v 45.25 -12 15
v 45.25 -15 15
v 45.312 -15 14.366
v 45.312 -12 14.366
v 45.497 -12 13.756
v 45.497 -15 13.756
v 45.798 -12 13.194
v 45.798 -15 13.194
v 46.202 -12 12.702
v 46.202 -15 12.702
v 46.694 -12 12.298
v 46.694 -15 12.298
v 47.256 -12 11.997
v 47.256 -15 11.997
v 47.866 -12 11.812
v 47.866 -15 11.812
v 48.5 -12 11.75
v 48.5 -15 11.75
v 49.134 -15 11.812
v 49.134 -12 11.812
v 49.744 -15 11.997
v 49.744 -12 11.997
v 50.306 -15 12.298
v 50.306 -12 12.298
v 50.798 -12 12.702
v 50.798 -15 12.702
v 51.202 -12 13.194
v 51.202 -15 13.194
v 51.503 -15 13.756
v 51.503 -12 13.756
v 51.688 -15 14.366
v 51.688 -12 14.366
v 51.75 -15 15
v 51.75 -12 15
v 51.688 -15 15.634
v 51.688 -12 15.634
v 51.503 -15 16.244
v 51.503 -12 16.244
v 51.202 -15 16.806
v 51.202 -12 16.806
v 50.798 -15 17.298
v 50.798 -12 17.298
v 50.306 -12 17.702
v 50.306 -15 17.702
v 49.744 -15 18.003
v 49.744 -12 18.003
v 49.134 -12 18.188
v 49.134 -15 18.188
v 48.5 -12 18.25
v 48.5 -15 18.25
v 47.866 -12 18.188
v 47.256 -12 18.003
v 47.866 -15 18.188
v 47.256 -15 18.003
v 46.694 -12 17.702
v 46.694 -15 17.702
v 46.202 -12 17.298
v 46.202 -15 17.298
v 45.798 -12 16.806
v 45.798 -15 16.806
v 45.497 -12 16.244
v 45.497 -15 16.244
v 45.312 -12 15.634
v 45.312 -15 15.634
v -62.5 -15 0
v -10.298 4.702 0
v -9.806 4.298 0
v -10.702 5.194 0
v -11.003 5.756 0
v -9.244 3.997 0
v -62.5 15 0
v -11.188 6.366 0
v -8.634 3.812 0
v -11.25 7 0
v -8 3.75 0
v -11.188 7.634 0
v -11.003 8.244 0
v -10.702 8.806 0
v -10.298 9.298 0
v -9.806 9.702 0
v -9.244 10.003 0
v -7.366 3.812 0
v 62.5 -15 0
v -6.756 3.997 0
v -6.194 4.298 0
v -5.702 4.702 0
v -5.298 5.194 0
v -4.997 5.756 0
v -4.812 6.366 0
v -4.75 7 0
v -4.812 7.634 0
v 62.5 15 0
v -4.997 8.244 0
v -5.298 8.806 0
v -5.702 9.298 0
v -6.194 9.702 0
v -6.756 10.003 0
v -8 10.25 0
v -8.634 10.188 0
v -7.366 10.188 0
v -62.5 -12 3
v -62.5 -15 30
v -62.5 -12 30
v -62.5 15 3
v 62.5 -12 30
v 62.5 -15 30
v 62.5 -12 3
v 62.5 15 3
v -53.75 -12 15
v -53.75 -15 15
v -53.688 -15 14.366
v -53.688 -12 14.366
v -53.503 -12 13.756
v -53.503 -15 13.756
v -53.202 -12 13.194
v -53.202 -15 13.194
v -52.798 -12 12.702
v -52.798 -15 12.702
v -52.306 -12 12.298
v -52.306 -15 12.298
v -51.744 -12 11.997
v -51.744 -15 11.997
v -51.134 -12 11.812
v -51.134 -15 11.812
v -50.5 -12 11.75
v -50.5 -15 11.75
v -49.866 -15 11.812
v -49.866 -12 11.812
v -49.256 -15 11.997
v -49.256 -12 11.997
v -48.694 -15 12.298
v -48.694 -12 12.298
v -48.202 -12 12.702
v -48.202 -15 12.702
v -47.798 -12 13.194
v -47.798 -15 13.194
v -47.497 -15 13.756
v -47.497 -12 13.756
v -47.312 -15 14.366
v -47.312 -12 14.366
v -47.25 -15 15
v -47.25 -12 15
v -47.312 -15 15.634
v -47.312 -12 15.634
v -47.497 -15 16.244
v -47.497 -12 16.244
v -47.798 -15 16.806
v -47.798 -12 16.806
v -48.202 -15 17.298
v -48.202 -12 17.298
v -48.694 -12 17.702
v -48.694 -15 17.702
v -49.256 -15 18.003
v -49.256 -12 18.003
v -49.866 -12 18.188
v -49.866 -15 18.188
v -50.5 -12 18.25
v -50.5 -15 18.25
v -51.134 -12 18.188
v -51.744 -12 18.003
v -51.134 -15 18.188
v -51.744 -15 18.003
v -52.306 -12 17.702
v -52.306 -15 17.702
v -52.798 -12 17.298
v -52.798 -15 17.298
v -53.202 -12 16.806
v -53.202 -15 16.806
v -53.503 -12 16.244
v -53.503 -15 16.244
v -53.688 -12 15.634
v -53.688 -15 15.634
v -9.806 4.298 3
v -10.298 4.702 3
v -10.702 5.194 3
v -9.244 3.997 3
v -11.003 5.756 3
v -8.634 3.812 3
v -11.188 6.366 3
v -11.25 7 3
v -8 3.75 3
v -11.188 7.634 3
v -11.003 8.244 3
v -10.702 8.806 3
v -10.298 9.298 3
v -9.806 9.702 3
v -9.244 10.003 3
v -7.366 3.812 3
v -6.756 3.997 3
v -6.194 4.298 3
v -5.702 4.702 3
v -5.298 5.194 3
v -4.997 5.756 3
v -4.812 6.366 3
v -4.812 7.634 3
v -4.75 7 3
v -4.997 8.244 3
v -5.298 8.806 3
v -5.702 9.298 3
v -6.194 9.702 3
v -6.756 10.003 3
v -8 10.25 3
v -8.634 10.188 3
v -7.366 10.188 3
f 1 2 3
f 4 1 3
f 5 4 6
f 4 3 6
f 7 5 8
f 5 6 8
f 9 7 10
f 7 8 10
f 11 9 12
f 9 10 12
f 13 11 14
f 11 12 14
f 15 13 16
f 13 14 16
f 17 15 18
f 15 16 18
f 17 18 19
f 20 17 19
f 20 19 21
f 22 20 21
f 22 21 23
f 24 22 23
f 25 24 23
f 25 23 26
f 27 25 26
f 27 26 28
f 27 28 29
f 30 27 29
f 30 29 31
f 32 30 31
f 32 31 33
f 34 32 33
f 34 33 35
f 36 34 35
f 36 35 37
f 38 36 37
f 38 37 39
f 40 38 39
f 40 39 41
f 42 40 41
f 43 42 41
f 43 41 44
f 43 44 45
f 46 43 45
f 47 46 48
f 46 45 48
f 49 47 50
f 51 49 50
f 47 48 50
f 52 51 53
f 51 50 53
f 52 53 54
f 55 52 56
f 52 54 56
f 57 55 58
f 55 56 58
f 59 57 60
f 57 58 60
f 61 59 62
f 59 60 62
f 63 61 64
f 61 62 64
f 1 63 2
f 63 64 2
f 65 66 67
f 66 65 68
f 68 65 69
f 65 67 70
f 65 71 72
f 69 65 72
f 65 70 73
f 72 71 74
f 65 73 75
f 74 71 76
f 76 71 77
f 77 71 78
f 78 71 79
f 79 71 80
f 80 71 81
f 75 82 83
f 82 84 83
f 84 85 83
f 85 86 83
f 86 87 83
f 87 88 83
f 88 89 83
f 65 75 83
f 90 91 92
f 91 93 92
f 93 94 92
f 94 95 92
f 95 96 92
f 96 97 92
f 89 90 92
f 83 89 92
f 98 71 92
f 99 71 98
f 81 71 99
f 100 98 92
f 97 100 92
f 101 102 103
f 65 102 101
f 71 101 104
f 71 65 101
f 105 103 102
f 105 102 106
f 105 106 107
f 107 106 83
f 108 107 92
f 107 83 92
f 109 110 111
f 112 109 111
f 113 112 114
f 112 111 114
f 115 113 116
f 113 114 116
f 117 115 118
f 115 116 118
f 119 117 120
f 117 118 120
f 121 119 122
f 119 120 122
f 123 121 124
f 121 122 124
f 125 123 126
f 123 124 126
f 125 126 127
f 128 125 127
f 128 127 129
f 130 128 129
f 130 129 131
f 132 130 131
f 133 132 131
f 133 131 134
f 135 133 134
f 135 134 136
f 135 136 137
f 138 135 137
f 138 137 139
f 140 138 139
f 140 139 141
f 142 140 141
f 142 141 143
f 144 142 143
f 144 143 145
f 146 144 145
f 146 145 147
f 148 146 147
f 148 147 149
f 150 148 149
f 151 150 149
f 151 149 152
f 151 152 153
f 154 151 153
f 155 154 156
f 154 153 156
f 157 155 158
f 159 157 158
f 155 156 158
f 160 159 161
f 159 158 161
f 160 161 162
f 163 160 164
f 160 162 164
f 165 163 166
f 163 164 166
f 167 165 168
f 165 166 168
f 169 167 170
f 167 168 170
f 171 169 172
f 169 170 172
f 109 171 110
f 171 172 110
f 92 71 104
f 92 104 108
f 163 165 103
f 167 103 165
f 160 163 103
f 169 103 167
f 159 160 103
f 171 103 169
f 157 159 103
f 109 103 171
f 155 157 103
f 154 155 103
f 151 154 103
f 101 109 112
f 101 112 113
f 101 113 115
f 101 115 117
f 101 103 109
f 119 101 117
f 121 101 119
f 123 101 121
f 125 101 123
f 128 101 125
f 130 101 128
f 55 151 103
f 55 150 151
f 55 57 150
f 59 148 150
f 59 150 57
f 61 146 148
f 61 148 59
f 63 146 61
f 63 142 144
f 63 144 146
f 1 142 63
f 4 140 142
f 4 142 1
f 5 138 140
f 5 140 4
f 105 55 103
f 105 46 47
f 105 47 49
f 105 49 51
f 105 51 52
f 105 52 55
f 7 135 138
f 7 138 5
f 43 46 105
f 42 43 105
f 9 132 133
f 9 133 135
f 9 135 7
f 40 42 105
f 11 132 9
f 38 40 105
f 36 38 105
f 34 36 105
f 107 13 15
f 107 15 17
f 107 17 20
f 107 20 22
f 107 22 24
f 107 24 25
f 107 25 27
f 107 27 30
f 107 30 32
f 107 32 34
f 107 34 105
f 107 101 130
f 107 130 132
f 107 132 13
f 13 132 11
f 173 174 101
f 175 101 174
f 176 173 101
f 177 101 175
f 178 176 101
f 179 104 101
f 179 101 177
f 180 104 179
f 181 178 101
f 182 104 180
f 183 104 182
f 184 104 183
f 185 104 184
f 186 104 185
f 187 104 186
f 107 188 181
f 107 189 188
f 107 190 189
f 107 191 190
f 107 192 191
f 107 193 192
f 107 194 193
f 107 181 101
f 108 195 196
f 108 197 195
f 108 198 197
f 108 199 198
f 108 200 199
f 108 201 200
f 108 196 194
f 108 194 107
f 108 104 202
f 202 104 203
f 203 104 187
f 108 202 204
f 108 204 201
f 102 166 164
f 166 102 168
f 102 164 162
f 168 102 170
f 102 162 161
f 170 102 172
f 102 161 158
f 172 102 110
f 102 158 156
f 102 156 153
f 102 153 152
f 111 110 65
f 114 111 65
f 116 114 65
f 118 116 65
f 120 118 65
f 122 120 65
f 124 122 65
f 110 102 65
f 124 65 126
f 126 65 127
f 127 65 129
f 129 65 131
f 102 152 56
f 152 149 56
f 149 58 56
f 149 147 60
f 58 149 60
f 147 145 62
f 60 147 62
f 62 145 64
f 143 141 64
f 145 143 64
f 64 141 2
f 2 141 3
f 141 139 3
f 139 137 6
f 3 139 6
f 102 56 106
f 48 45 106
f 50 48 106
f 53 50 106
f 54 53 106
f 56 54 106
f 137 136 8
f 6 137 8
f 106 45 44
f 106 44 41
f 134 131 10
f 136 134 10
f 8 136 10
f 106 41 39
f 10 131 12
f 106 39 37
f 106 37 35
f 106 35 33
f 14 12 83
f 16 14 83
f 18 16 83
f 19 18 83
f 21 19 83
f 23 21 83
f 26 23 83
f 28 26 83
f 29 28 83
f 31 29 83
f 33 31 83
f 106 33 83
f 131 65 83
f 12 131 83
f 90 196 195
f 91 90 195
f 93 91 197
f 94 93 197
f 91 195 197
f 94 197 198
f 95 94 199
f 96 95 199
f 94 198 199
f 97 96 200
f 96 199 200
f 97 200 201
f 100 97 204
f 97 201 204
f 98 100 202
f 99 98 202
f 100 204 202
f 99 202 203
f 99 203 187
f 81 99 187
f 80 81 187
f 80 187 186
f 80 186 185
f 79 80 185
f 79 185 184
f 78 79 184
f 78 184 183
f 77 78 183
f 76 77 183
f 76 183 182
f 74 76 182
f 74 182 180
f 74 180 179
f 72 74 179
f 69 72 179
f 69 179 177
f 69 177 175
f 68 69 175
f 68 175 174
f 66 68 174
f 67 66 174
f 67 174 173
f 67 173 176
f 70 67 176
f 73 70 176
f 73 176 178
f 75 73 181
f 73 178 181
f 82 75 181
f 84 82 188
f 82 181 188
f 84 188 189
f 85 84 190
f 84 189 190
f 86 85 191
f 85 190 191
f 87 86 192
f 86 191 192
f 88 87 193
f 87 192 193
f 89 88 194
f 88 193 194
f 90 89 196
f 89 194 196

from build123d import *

# Parameters (mm, degrees)
SKETCH1_W                      = 125
SKETCH1_H                      = 30
BOSS_EXTRUDE1_DEPTH            = 3
SKETCH2_W                      = 125
SKETCH2_H                      = 3
BOSS_EXTRUDE2_DEPTH            = 27
F_6_5_6_5_DIAMETER_HOLE1_D     = 6.5
F_6_5_6_5_DIAMETER_HOLE1_DEPTH = 10
F_6_5_6_5_DIAMETER_HOLE1_TIP   = 1.952797012
F_6_5_6_5_DIAMETER_HOLE2_D     = 6.5
F_6_5_6_5_DIAMETER_HOLE2_DEPTH = 32
F_6_5_6_5_DIAMETER_HOLE2_TIP   = 1.952797012


with BuildPart() as part:
    # Sketch1 → Boss-Extrude1 (new body)
    with BuildSketch(Plane.XY):
        Rectangle(SKETCH1_W, SKETCH1_H)
    extrude(amount=BOSS_EXTRUDE1_DEPTH)

    # Sketch2 → Boss-Extrude2 (add)
    with BuildSketch(Plane.XY.offset(3)):
        with Locations((0, -13.5)):
            Rectangle(SKETCH2_W, SKETCH2_H)
    extrude(amount=BOSS_EXTRUDE2_DEPTH)

    # Ø6.5 (6.5) Diameter Hole1
    with Locations(Plane(origin=(0, -12, 0), x_dir=(1, 0, 0), z_dir=(0, 1, 0))):
        with Locations((48.5, -15), (-50.5, -15)):
            Hole(F_6_5_6_5_DIAMETER_HOLE1_D / 2, depth=F_6_5_6_5_DIAMETER_HOLE1_DEPTH)
            with Locations((0, 0, -(F_6_5_6_5_DIAMETER_HOLE1_DEPTH + F_6_5_6_5_DIAMETER_HOLE1_TIP / 2))):  # 118° drill point
                Cone(0, F_6_5_6_5_DIAMETER_HOLE1_D / 2, F_6_5_6_5_DIAMETER_HOLE1_TIP, mode=Mode.SUBTRACT)

    # Ø6.5 (6.5) Diameter Hole2
    with Locations(Plane(origin=(0, 0, 0), x_dir=(-1, 0, 0), z_dir=(0, 0, -1))):
        with Locations((8.000002921, 7)):
            Hole(F_6_5_6_5_DIAMETER_HOLE2_D / 2, depth=F_6_5_6_5_DIAMETER_HOLE2_DEPTH)
            with Locations((0, 0, -(F_6_5_6_5_DIAMETER_HOLE2_DEPTH + F_6_5_6_5_DIAMETER_HOLE2_TIP / 2))):  # 118° drill point
                Cone(0, F_6_5_6_5_DIAMETER_HOLE2_D / 2, F_6_5_6_5_DIAMETER_HOLE2_TIP, mode=Mode.SUBTRACT)


solid = part.part
